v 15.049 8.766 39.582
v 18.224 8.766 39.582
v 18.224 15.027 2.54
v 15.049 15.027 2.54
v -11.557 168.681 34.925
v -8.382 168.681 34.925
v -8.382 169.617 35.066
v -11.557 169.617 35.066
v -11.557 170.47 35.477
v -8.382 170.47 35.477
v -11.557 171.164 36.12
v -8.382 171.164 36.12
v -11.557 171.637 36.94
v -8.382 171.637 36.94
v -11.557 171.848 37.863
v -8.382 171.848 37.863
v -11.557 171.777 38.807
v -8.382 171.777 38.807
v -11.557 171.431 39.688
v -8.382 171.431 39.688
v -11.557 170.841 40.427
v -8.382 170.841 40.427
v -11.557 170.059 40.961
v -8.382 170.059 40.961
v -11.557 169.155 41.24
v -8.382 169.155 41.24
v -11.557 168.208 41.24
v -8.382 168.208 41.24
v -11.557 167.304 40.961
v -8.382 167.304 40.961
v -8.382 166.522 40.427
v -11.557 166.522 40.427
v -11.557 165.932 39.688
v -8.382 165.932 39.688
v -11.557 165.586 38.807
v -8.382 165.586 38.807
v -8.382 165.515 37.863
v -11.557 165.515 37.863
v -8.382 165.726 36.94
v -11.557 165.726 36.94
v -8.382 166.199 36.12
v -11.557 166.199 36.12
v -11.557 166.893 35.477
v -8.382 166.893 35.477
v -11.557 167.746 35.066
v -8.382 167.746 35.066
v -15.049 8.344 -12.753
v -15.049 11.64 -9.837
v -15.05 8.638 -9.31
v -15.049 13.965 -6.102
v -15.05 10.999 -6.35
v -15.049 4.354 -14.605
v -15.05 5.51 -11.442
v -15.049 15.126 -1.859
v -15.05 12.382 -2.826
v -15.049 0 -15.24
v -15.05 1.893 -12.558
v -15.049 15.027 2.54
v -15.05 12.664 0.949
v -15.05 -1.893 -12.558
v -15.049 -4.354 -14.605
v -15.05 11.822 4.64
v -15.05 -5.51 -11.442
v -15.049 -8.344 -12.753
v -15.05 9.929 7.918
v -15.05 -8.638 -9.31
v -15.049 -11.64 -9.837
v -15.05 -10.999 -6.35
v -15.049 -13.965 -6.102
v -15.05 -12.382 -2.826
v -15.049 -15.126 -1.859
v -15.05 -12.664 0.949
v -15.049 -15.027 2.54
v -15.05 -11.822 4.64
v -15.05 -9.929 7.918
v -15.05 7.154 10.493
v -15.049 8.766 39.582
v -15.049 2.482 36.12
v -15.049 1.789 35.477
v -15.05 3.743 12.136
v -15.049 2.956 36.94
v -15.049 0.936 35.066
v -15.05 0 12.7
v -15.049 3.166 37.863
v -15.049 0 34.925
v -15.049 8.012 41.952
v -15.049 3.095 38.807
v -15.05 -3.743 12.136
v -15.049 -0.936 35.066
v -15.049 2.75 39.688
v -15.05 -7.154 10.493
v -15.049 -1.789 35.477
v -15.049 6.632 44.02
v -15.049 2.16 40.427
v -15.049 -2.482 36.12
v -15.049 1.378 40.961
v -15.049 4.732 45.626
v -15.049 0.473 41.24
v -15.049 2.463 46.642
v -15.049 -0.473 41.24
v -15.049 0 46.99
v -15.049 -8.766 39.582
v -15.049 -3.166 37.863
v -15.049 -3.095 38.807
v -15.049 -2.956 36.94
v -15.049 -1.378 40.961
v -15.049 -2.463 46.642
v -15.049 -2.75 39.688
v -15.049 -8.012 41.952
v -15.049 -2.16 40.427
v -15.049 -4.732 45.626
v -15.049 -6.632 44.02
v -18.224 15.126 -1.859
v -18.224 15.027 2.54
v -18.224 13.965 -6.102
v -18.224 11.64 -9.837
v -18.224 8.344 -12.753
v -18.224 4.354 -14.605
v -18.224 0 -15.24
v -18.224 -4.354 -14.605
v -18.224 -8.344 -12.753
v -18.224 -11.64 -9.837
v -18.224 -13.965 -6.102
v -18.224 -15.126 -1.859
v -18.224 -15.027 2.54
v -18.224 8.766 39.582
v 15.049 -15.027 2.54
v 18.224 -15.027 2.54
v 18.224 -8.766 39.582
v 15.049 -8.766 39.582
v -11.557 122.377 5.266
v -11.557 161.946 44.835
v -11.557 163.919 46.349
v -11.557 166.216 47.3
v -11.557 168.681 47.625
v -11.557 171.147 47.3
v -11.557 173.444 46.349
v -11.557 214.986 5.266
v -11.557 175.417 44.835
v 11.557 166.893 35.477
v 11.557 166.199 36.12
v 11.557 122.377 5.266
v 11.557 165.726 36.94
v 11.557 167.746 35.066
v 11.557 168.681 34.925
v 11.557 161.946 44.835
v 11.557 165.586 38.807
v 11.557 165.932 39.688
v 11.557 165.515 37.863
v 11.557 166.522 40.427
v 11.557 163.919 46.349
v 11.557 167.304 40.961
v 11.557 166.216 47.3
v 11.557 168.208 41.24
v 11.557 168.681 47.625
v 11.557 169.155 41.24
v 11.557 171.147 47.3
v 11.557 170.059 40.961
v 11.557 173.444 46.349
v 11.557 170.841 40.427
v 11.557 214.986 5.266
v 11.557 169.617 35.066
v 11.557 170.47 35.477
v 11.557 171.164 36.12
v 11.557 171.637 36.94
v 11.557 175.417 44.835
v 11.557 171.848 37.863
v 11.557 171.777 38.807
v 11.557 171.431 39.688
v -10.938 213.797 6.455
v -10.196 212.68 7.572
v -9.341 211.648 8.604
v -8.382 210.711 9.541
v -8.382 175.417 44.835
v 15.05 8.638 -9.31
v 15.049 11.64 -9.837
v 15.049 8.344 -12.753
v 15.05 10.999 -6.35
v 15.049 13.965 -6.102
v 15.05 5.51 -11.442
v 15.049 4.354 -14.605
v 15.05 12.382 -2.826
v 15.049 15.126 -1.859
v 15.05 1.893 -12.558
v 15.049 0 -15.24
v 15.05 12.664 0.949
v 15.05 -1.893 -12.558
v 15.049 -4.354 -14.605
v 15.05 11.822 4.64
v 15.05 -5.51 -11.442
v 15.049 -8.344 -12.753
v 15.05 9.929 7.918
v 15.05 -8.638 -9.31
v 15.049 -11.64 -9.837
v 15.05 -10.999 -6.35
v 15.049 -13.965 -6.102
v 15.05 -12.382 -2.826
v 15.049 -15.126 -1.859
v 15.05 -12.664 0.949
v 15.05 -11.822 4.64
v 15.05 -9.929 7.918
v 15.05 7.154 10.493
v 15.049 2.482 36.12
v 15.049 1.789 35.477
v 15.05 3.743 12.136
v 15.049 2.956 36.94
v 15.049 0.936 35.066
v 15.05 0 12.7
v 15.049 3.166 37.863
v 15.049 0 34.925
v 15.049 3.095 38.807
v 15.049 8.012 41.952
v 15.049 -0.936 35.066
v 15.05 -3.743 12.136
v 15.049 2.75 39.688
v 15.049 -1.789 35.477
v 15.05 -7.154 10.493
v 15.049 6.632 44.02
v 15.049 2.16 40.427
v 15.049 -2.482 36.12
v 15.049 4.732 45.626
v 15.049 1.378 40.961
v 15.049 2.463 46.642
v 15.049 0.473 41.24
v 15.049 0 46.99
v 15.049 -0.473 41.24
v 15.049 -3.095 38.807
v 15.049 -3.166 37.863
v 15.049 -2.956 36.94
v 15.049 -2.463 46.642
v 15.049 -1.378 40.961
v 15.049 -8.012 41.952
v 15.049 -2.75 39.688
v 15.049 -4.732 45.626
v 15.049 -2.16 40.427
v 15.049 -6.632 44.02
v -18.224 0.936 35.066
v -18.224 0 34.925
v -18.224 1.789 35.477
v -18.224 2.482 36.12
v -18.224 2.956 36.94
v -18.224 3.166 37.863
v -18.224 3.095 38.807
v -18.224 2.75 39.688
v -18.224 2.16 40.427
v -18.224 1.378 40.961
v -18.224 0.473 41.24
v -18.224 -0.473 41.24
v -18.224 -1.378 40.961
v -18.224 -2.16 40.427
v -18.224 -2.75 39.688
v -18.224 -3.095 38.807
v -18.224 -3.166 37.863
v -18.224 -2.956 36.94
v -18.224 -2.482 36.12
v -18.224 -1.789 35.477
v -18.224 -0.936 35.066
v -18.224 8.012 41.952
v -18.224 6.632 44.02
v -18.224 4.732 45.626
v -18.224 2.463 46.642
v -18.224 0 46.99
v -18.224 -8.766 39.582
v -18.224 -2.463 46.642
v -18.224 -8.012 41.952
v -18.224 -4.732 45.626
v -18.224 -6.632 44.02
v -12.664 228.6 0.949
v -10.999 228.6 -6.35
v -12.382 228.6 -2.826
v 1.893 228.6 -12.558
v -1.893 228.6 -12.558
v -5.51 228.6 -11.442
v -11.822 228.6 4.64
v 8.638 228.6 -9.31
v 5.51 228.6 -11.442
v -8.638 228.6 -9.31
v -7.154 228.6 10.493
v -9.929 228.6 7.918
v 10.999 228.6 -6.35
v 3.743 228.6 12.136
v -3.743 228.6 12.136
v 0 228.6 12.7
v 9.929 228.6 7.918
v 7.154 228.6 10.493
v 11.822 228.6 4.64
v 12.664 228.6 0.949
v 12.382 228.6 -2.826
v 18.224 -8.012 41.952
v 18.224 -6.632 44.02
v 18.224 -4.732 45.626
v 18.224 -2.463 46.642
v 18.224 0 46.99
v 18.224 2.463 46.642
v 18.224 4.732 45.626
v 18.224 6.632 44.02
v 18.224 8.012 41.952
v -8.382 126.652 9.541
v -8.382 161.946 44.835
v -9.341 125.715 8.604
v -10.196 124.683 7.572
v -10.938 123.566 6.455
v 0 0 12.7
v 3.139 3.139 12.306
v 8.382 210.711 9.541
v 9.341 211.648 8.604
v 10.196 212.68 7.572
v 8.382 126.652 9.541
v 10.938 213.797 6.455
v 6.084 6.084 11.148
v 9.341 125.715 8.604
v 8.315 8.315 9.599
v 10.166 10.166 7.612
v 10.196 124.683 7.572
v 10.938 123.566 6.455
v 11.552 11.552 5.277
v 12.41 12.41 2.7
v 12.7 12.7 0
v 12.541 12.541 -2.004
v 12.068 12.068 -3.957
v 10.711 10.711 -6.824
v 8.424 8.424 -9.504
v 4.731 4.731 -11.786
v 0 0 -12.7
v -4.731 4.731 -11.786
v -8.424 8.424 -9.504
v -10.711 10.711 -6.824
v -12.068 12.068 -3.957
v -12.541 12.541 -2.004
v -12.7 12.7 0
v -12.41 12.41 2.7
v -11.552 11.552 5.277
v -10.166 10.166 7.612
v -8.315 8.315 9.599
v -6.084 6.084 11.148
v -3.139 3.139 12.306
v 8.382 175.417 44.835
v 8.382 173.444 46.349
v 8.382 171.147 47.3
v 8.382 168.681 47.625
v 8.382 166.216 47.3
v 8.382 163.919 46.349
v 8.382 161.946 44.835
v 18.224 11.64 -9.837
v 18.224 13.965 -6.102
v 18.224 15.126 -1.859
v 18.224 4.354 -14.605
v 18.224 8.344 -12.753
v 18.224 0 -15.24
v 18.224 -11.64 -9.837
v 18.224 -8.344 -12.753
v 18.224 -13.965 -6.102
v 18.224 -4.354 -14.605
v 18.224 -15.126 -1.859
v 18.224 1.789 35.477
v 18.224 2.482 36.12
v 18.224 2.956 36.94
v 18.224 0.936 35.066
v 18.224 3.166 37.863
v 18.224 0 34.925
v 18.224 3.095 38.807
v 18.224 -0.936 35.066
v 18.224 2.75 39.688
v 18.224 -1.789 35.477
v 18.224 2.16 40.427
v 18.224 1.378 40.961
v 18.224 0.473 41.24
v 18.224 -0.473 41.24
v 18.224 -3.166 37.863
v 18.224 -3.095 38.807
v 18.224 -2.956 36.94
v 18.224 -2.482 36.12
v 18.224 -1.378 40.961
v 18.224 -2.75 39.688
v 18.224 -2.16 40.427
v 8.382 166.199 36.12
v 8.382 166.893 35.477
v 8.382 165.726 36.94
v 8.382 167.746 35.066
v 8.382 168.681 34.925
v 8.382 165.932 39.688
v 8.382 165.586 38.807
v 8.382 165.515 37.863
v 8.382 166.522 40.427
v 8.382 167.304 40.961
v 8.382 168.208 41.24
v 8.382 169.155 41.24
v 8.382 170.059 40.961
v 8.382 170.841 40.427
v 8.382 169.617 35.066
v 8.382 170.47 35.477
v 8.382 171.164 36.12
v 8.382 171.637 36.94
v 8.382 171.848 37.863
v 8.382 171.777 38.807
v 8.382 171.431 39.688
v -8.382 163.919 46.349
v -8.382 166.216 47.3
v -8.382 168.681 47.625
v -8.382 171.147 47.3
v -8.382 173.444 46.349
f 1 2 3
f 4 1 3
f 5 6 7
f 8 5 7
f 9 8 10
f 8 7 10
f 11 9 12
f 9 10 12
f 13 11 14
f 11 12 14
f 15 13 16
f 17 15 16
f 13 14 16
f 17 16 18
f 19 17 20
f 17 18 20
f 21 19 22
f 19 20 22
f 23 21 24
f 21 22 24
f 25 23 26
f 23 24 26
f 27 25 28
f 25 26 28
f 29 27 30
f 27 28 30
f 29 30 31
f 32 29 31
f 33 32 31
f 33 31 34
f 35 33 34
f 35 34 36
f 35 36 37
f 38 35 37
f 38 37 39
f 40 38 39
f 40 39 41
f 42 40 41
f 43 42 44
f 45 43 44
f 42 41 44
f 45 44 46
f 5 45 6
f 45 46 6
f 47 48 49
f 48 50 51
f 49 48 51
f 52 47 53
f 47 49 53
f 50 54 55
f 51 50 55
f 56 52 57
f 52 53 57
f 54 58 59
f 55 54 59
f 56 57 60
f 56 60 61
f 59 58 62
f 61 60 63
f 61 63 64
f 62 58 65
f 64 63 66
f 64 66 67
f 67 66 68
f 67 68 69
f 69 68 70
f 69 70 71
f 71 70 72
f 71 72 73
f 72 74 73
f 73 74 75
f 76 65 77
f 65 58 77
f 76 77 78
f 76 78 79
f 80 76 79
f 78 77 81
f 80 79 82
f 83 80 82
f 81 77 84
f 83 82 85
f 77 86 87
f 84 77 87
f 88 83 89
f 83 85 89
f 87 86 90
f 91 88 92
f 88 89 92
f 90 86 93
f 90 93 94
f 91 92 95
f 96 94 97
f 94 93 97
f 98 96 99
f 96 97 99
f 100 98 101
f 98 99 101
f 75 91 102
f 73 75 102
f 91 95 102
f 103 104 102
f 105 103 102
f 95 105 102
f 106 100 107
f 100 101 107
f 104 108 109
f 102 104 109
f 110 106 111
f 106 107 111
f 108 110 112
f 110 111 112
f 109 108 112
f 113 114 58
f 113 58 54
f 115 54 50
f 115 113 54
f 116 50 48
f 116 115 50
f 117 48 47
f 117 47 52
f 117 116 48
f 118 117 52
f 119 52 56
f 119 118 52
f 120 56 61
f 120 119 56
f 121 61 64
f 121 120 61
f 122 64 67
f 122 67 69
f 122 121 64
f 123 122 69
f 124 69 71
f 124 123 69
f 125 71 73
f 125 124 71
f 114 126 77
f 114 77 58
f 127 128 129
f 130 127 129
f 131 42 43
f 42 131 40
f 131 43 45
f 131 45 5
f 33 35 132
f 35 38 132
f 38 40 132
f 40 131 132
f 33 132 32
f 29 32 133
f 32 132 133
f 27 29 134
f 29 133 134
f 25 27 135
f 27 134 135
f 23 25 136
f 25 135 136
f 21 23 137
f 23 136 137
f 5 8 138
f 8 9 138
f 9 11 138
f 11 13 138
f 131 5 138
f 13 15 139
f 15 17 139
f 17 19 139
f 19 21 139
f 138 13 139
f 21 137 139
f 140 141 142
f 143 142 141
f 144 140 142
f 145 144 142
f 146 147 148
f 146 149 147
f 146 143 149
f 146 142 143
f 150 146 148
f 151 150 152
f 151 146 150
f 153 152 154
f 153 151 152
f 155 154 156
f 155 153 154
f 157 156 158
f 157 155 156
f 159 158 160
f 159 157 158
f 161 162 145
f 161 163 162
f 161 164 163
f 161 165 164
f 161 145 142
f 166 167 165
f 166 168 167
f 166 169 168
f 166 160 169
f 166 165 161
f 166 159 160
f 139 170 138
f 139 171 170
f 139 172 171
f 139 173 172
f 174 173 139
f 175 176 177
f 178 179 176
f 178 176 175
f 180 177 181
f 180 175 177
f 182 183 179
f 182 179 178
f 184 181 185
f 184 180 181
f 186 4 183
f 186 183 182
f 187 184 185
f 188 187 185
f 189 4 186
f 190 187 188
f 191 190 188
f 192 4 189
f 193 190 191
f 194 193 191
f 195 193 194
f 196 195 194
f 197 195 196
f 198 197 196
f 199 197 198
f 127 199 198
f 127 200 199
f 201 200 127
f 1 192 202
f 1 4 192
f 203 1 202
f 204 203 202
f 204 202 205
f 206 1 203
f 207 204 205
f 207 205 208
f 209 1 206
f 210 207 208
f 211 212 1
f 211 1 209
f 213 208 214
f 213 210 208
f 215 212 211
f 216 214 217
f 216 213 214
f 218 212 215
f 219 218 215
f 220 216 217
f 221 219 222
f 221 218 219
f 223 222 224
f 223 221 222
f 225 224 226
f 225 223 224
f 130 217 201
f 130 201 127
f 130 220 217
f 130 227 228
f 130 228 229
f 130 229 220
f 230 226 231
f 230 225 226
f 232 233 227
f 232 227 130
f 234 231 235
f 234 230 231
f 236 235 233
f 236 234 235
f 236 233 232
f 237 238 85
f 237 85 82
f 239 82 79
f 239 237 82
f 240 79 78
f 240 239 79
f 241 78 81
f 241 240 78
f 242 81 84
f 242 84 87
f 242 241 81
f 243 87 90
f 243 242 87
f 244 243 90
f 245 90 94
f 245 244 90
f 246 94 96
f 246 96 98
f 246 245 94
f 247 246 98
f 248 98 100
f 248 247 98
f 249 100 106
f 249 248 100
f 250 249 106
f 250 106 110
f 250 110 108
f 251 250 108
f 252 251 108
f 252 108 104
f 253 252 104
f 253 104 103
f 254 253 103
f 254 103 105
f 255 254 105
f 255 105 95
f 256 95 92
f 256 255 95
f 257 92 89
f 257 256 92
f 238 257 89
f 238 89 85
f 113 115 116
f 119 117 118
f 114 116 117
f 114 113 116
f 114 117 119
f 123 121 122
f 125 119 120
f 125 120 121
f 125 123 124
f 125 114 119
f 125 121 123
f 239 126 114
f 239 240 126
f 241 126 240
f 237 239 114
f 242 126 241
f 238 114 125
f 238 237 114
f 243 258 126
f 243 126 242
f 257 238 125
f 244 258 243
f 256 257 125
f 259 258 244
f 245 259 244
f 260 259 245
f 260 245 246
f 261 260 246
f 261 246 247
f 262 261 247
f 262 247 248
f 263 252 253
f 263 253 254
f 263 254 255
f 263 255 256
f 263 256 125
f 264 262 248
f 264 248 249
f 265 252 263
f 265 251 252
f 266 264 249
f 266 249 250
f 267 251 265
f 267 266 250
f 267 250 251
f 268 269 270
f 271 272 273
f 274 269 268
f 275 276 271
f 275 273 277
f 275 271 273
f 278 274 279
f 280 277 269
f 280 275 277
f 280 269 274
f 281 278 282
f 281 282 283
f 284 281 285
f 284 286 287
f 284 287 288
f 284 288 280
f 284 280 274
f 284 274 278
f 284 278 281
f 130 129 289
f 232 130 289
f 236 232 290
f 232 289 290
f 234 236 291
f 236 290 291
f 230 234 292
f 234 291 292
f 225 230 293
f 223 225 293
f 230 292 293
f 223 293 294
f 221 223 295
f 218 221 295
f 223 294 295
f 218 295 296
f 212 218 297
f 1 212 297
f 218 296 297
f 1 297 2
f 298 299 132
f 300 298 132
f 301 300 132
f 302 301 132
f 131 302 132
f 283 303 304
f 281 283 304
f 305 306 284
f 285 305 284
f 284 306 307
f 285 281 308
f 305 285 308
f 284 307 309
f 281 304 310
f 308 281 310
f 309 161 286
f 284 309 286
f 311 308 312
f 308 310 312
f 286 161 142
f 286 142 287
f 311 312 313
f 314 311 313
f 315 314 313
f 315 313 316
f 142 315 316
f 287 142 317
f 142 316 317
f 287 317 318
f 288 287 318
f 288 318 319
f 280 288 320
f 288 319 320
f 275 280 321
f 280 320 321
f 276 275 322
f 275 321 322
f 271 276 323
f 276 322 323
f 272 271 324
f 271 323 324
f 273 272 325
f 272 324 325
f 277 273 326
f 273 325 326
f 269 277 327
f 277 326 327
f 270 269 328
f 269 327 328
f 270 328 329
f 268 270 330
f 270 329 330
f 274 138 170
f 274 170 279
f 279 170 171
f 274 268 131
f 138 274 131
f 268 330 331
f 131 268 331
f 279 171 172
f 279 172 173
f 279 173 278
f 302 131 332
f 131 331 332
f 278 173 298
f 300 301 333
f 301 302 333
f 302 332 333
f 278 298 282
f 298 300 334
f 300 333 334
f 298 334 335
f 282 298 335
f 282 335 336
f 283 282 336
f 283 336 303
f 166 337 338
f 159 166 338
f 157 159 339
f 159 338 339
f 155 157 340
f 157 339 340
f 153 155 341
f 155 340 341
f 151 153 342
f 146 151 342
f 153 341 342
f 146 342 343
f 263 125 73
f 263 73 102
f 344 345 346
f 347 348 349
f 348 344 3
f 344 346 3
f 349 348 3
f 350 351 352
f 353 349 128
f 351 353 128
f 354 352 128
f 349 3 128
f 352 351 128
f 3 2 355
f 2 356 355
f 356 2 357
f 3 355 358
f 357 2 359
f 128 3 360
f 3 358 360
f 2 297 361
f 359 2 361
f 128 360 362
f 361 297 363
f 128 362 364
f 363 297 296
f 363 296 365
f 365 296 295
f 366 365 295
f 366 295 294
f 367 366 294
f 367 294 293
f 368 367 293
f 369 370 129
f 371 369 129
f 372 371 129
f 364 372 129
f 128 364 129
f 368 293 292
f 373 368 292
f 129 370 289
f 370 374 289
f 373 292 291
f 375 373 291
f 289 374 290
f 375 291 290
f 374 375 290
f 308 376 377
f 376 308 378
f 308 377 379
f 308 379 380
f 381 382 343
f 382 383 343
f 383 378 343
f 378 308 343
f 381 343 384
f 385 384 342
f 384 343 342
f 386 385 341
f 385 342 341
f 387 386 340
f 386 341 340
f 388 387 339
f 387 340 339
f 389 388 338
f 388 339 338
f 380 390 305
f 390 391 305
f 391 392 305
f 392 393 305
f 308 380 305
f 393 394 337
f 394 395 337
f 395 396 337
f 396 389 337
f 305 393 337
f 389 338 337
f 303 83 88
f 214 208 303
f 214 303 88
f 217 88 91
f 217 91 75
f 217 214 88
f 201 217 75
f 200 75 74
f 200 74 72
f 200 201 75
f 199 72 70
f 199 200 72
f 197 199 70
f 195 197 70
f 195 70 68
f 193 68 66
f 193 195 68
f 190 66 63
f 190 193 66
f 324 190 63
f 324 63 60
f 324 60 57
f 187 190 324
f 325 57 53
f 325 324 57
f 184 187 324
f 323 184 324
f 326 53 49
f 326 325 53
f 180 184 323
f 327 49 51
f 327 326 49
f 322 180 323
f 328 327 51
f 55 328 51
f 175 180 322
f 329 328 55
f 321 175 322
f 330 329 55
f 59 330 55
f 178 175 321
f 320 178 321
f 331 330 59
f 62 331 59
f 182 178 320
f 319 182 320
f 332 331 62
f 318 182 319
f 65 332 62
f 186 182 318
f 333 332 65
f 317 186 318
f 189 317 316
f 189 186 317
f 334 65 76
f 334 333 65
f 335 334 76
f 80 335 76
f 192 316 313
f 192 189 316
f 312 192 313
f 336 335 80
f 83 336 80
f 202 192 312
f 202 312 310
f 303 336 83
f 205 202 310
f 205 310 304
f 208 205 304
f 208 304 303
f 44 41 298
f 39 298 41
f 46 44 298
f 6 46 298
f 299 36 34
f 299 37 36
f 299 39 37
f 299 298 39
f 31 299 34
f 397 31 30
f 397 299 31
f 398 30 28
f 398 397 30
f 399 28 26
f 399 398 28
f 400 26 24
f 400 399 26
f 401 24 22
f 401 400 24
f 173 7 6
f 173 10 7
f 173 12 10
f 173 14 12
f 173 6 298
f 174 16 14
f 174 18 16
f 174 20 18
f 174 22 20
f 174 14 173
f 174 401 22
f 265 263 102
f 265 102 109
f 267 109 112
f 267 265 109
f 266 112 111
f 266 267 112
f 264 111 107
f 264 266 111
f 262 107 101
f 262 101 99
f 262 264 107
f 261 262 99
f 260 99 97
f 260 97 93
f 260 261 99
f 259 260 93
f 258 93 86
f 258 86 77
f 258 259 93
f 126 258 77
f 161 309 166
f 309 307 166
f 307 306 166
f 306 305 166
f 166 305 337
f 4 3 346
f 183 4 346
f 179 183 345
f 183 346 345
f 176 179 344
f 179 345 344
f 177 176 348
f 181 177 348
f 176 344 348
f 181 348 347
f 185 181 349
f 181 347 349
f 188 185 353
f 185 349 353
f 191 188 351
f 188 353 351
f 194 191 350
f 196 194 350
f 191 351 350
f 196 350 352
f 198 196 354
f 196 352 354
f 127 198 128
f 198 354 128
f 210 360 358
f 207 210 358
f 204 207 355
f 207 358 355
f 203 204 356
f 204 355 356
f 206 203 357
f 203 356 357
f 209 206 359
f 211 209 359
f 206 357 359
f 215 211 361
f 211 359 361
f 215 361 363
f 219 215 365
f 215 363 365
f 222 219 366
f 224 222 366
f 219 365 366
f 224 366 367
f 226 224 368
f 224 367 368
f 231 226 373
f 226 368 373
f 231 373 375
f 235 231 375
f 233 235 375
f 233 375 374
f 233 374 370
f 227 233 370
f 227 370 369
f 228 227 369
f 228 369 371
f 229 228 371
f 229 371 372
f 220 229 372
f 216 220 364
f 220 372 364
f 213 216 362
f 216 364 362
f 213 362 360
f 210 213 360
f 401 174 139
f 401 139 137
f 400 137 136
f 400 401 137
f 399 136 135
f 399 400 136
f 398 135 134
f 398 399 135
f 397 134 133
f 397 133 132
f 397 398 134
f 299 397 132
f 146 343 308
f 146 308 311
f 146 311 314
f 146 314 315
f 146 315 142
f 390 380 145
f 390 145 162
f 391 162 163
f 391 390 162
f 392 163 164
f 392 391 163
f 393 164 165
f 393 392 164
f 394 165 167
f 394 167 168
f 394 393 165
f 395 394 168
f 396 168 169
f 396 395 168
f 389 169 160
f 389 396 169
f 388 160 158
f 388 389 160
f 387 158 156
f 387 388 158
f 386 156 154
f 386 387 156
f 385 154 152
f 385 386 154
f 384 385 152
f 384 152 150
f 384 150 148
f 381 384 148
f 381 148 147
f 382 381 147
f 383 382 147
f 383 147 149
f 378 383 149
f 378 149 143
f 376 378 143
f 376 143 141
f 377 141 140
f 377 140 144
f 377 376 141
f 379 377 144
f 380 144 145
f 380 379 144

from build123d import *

# Parameters (mm, degrees)
SKETCH1_R           = 12.7
BOSS_EXTRUDE1_DEPTH = 15.0495
BOSS_EXTRUDE2_START = 18.2245
SKETCH1_6_R         = 12.7
SKETCH1_6_R_2       = 3.175
BOSS_EXTRUDE2_DEPTH = 3.175
BOSS_EXTRUDE3_START = 8.382
SKETCH1_8_R         = 3.175
BOSS_EXTRUDE3_DEPTH = 3.175
SKETCH2_R           = 12.7
BOSS_EXTRUDE4_DEPTH = 228.6


with BuildPart() as part:
    # Sketch1 → Boss-Extrude1 (new, symmetric)
    with BuildSketch(Plane.YZ):
        with Locations(Location((0, 0, 0), (0, 0, 90))):
            Circle(SKETCH1_R)
    extrude(amount=BOSS_EXTRUDE1_DEPTH, both=True)

    # Sketch1<6> → Boss-Extrude2 (add)
    # profile 1 of 2: a face of its own
    with BuildSketch(Plane.YZ.offset(BOSS_EXTRUDE2_START)):
        with BuildLine():
            Line((8.765658212, 39.581666667), (15.026842649, 2.54))
            ThreePointArc((15.026842649, 2.54), (0, -15.24), (-15.026842649, 2.54))
            Line((-15.026842649, 2.54), (-8.765658212, 39.581666667))
            ThreePointArc((-8.765658212, 39.581666667), (0, 46.99), (8.765658212, 39.581666667))
        make_face()
        with Locations(Location((0, 0, 0), (0, 0, 90))):
            Circle(SKETCH1_6_R, mode=Mode.SUBTRACT)
        with Locations(Location((0, 38.1, 0), (0, 0, 270))):
            Circle(SKETCH1_6_R_2, mode=Mode.SUBTRACT)
    # profile 2 of 2: a face of its own
    with BuildSketch(Plane.YZ.offset(BOSS_EXTRUDE2_START)):
        with Locations(Location((0, 0, 0), (0, 0, 90))):
            Circle(SKETCH1_6_R)
    extrude(amount=-BOSS_EXTRUDE2_DEPTH)



with BuildPart() as body_2:
    # Sketch1<8> → Boss-Extrude3 (new body)
    with BuildSketch(Plane.YZ.offset(BOSS_EXTRUDE3_START)):
        with BuildLine():
            Line((161.946207909, 44.835192091), (117.111015818, 0))
            Line((117.111015818, 0), (220.251784182, 0))
            Line((220.251784182, 0), (175.416592091, 44.835192091))
            ThreePointArc((175.416592091, 44.835192091), (168.6814, 47.625), (161.946207909, 44.835192091))
        make_face()
        with Locations(Location((168.6814, 38.1, 0), (0, 0, 270))):
            Circle(SKETCH1_8_R, mode=Mode.SUBTRACT)
    extrude(amount=BOSS_EXTRUDE3_DEPTH)


with BuildPart() as part_1:
    add(part.part)

    add(body_2.part)  # Boss-Extrude4 merges body 2
    # Sketch2 → Boss-Extrude4 (add)
    with BuildSketch(Plane(origin=(0, 0, 0), x_dir=(-1, 0, 0), z_dir=(0, 1, 0))):
        with Locations(Location((0, 0, 0), (0, 0, 90))):
            Circle(SKETCH2_R)
    extrude(amount=BOSS_EXTRUDE4_DEPTH)

    # Mirror1: part across plane


with BuildPart() as part_2:
    add(part_1.part)
    add(part_1.part.mirror(Plane(origin=(0, 0, 0), x_dir=(0, 0, 1), z_dir=(1, 0, 0))))


solid = part_2.part
